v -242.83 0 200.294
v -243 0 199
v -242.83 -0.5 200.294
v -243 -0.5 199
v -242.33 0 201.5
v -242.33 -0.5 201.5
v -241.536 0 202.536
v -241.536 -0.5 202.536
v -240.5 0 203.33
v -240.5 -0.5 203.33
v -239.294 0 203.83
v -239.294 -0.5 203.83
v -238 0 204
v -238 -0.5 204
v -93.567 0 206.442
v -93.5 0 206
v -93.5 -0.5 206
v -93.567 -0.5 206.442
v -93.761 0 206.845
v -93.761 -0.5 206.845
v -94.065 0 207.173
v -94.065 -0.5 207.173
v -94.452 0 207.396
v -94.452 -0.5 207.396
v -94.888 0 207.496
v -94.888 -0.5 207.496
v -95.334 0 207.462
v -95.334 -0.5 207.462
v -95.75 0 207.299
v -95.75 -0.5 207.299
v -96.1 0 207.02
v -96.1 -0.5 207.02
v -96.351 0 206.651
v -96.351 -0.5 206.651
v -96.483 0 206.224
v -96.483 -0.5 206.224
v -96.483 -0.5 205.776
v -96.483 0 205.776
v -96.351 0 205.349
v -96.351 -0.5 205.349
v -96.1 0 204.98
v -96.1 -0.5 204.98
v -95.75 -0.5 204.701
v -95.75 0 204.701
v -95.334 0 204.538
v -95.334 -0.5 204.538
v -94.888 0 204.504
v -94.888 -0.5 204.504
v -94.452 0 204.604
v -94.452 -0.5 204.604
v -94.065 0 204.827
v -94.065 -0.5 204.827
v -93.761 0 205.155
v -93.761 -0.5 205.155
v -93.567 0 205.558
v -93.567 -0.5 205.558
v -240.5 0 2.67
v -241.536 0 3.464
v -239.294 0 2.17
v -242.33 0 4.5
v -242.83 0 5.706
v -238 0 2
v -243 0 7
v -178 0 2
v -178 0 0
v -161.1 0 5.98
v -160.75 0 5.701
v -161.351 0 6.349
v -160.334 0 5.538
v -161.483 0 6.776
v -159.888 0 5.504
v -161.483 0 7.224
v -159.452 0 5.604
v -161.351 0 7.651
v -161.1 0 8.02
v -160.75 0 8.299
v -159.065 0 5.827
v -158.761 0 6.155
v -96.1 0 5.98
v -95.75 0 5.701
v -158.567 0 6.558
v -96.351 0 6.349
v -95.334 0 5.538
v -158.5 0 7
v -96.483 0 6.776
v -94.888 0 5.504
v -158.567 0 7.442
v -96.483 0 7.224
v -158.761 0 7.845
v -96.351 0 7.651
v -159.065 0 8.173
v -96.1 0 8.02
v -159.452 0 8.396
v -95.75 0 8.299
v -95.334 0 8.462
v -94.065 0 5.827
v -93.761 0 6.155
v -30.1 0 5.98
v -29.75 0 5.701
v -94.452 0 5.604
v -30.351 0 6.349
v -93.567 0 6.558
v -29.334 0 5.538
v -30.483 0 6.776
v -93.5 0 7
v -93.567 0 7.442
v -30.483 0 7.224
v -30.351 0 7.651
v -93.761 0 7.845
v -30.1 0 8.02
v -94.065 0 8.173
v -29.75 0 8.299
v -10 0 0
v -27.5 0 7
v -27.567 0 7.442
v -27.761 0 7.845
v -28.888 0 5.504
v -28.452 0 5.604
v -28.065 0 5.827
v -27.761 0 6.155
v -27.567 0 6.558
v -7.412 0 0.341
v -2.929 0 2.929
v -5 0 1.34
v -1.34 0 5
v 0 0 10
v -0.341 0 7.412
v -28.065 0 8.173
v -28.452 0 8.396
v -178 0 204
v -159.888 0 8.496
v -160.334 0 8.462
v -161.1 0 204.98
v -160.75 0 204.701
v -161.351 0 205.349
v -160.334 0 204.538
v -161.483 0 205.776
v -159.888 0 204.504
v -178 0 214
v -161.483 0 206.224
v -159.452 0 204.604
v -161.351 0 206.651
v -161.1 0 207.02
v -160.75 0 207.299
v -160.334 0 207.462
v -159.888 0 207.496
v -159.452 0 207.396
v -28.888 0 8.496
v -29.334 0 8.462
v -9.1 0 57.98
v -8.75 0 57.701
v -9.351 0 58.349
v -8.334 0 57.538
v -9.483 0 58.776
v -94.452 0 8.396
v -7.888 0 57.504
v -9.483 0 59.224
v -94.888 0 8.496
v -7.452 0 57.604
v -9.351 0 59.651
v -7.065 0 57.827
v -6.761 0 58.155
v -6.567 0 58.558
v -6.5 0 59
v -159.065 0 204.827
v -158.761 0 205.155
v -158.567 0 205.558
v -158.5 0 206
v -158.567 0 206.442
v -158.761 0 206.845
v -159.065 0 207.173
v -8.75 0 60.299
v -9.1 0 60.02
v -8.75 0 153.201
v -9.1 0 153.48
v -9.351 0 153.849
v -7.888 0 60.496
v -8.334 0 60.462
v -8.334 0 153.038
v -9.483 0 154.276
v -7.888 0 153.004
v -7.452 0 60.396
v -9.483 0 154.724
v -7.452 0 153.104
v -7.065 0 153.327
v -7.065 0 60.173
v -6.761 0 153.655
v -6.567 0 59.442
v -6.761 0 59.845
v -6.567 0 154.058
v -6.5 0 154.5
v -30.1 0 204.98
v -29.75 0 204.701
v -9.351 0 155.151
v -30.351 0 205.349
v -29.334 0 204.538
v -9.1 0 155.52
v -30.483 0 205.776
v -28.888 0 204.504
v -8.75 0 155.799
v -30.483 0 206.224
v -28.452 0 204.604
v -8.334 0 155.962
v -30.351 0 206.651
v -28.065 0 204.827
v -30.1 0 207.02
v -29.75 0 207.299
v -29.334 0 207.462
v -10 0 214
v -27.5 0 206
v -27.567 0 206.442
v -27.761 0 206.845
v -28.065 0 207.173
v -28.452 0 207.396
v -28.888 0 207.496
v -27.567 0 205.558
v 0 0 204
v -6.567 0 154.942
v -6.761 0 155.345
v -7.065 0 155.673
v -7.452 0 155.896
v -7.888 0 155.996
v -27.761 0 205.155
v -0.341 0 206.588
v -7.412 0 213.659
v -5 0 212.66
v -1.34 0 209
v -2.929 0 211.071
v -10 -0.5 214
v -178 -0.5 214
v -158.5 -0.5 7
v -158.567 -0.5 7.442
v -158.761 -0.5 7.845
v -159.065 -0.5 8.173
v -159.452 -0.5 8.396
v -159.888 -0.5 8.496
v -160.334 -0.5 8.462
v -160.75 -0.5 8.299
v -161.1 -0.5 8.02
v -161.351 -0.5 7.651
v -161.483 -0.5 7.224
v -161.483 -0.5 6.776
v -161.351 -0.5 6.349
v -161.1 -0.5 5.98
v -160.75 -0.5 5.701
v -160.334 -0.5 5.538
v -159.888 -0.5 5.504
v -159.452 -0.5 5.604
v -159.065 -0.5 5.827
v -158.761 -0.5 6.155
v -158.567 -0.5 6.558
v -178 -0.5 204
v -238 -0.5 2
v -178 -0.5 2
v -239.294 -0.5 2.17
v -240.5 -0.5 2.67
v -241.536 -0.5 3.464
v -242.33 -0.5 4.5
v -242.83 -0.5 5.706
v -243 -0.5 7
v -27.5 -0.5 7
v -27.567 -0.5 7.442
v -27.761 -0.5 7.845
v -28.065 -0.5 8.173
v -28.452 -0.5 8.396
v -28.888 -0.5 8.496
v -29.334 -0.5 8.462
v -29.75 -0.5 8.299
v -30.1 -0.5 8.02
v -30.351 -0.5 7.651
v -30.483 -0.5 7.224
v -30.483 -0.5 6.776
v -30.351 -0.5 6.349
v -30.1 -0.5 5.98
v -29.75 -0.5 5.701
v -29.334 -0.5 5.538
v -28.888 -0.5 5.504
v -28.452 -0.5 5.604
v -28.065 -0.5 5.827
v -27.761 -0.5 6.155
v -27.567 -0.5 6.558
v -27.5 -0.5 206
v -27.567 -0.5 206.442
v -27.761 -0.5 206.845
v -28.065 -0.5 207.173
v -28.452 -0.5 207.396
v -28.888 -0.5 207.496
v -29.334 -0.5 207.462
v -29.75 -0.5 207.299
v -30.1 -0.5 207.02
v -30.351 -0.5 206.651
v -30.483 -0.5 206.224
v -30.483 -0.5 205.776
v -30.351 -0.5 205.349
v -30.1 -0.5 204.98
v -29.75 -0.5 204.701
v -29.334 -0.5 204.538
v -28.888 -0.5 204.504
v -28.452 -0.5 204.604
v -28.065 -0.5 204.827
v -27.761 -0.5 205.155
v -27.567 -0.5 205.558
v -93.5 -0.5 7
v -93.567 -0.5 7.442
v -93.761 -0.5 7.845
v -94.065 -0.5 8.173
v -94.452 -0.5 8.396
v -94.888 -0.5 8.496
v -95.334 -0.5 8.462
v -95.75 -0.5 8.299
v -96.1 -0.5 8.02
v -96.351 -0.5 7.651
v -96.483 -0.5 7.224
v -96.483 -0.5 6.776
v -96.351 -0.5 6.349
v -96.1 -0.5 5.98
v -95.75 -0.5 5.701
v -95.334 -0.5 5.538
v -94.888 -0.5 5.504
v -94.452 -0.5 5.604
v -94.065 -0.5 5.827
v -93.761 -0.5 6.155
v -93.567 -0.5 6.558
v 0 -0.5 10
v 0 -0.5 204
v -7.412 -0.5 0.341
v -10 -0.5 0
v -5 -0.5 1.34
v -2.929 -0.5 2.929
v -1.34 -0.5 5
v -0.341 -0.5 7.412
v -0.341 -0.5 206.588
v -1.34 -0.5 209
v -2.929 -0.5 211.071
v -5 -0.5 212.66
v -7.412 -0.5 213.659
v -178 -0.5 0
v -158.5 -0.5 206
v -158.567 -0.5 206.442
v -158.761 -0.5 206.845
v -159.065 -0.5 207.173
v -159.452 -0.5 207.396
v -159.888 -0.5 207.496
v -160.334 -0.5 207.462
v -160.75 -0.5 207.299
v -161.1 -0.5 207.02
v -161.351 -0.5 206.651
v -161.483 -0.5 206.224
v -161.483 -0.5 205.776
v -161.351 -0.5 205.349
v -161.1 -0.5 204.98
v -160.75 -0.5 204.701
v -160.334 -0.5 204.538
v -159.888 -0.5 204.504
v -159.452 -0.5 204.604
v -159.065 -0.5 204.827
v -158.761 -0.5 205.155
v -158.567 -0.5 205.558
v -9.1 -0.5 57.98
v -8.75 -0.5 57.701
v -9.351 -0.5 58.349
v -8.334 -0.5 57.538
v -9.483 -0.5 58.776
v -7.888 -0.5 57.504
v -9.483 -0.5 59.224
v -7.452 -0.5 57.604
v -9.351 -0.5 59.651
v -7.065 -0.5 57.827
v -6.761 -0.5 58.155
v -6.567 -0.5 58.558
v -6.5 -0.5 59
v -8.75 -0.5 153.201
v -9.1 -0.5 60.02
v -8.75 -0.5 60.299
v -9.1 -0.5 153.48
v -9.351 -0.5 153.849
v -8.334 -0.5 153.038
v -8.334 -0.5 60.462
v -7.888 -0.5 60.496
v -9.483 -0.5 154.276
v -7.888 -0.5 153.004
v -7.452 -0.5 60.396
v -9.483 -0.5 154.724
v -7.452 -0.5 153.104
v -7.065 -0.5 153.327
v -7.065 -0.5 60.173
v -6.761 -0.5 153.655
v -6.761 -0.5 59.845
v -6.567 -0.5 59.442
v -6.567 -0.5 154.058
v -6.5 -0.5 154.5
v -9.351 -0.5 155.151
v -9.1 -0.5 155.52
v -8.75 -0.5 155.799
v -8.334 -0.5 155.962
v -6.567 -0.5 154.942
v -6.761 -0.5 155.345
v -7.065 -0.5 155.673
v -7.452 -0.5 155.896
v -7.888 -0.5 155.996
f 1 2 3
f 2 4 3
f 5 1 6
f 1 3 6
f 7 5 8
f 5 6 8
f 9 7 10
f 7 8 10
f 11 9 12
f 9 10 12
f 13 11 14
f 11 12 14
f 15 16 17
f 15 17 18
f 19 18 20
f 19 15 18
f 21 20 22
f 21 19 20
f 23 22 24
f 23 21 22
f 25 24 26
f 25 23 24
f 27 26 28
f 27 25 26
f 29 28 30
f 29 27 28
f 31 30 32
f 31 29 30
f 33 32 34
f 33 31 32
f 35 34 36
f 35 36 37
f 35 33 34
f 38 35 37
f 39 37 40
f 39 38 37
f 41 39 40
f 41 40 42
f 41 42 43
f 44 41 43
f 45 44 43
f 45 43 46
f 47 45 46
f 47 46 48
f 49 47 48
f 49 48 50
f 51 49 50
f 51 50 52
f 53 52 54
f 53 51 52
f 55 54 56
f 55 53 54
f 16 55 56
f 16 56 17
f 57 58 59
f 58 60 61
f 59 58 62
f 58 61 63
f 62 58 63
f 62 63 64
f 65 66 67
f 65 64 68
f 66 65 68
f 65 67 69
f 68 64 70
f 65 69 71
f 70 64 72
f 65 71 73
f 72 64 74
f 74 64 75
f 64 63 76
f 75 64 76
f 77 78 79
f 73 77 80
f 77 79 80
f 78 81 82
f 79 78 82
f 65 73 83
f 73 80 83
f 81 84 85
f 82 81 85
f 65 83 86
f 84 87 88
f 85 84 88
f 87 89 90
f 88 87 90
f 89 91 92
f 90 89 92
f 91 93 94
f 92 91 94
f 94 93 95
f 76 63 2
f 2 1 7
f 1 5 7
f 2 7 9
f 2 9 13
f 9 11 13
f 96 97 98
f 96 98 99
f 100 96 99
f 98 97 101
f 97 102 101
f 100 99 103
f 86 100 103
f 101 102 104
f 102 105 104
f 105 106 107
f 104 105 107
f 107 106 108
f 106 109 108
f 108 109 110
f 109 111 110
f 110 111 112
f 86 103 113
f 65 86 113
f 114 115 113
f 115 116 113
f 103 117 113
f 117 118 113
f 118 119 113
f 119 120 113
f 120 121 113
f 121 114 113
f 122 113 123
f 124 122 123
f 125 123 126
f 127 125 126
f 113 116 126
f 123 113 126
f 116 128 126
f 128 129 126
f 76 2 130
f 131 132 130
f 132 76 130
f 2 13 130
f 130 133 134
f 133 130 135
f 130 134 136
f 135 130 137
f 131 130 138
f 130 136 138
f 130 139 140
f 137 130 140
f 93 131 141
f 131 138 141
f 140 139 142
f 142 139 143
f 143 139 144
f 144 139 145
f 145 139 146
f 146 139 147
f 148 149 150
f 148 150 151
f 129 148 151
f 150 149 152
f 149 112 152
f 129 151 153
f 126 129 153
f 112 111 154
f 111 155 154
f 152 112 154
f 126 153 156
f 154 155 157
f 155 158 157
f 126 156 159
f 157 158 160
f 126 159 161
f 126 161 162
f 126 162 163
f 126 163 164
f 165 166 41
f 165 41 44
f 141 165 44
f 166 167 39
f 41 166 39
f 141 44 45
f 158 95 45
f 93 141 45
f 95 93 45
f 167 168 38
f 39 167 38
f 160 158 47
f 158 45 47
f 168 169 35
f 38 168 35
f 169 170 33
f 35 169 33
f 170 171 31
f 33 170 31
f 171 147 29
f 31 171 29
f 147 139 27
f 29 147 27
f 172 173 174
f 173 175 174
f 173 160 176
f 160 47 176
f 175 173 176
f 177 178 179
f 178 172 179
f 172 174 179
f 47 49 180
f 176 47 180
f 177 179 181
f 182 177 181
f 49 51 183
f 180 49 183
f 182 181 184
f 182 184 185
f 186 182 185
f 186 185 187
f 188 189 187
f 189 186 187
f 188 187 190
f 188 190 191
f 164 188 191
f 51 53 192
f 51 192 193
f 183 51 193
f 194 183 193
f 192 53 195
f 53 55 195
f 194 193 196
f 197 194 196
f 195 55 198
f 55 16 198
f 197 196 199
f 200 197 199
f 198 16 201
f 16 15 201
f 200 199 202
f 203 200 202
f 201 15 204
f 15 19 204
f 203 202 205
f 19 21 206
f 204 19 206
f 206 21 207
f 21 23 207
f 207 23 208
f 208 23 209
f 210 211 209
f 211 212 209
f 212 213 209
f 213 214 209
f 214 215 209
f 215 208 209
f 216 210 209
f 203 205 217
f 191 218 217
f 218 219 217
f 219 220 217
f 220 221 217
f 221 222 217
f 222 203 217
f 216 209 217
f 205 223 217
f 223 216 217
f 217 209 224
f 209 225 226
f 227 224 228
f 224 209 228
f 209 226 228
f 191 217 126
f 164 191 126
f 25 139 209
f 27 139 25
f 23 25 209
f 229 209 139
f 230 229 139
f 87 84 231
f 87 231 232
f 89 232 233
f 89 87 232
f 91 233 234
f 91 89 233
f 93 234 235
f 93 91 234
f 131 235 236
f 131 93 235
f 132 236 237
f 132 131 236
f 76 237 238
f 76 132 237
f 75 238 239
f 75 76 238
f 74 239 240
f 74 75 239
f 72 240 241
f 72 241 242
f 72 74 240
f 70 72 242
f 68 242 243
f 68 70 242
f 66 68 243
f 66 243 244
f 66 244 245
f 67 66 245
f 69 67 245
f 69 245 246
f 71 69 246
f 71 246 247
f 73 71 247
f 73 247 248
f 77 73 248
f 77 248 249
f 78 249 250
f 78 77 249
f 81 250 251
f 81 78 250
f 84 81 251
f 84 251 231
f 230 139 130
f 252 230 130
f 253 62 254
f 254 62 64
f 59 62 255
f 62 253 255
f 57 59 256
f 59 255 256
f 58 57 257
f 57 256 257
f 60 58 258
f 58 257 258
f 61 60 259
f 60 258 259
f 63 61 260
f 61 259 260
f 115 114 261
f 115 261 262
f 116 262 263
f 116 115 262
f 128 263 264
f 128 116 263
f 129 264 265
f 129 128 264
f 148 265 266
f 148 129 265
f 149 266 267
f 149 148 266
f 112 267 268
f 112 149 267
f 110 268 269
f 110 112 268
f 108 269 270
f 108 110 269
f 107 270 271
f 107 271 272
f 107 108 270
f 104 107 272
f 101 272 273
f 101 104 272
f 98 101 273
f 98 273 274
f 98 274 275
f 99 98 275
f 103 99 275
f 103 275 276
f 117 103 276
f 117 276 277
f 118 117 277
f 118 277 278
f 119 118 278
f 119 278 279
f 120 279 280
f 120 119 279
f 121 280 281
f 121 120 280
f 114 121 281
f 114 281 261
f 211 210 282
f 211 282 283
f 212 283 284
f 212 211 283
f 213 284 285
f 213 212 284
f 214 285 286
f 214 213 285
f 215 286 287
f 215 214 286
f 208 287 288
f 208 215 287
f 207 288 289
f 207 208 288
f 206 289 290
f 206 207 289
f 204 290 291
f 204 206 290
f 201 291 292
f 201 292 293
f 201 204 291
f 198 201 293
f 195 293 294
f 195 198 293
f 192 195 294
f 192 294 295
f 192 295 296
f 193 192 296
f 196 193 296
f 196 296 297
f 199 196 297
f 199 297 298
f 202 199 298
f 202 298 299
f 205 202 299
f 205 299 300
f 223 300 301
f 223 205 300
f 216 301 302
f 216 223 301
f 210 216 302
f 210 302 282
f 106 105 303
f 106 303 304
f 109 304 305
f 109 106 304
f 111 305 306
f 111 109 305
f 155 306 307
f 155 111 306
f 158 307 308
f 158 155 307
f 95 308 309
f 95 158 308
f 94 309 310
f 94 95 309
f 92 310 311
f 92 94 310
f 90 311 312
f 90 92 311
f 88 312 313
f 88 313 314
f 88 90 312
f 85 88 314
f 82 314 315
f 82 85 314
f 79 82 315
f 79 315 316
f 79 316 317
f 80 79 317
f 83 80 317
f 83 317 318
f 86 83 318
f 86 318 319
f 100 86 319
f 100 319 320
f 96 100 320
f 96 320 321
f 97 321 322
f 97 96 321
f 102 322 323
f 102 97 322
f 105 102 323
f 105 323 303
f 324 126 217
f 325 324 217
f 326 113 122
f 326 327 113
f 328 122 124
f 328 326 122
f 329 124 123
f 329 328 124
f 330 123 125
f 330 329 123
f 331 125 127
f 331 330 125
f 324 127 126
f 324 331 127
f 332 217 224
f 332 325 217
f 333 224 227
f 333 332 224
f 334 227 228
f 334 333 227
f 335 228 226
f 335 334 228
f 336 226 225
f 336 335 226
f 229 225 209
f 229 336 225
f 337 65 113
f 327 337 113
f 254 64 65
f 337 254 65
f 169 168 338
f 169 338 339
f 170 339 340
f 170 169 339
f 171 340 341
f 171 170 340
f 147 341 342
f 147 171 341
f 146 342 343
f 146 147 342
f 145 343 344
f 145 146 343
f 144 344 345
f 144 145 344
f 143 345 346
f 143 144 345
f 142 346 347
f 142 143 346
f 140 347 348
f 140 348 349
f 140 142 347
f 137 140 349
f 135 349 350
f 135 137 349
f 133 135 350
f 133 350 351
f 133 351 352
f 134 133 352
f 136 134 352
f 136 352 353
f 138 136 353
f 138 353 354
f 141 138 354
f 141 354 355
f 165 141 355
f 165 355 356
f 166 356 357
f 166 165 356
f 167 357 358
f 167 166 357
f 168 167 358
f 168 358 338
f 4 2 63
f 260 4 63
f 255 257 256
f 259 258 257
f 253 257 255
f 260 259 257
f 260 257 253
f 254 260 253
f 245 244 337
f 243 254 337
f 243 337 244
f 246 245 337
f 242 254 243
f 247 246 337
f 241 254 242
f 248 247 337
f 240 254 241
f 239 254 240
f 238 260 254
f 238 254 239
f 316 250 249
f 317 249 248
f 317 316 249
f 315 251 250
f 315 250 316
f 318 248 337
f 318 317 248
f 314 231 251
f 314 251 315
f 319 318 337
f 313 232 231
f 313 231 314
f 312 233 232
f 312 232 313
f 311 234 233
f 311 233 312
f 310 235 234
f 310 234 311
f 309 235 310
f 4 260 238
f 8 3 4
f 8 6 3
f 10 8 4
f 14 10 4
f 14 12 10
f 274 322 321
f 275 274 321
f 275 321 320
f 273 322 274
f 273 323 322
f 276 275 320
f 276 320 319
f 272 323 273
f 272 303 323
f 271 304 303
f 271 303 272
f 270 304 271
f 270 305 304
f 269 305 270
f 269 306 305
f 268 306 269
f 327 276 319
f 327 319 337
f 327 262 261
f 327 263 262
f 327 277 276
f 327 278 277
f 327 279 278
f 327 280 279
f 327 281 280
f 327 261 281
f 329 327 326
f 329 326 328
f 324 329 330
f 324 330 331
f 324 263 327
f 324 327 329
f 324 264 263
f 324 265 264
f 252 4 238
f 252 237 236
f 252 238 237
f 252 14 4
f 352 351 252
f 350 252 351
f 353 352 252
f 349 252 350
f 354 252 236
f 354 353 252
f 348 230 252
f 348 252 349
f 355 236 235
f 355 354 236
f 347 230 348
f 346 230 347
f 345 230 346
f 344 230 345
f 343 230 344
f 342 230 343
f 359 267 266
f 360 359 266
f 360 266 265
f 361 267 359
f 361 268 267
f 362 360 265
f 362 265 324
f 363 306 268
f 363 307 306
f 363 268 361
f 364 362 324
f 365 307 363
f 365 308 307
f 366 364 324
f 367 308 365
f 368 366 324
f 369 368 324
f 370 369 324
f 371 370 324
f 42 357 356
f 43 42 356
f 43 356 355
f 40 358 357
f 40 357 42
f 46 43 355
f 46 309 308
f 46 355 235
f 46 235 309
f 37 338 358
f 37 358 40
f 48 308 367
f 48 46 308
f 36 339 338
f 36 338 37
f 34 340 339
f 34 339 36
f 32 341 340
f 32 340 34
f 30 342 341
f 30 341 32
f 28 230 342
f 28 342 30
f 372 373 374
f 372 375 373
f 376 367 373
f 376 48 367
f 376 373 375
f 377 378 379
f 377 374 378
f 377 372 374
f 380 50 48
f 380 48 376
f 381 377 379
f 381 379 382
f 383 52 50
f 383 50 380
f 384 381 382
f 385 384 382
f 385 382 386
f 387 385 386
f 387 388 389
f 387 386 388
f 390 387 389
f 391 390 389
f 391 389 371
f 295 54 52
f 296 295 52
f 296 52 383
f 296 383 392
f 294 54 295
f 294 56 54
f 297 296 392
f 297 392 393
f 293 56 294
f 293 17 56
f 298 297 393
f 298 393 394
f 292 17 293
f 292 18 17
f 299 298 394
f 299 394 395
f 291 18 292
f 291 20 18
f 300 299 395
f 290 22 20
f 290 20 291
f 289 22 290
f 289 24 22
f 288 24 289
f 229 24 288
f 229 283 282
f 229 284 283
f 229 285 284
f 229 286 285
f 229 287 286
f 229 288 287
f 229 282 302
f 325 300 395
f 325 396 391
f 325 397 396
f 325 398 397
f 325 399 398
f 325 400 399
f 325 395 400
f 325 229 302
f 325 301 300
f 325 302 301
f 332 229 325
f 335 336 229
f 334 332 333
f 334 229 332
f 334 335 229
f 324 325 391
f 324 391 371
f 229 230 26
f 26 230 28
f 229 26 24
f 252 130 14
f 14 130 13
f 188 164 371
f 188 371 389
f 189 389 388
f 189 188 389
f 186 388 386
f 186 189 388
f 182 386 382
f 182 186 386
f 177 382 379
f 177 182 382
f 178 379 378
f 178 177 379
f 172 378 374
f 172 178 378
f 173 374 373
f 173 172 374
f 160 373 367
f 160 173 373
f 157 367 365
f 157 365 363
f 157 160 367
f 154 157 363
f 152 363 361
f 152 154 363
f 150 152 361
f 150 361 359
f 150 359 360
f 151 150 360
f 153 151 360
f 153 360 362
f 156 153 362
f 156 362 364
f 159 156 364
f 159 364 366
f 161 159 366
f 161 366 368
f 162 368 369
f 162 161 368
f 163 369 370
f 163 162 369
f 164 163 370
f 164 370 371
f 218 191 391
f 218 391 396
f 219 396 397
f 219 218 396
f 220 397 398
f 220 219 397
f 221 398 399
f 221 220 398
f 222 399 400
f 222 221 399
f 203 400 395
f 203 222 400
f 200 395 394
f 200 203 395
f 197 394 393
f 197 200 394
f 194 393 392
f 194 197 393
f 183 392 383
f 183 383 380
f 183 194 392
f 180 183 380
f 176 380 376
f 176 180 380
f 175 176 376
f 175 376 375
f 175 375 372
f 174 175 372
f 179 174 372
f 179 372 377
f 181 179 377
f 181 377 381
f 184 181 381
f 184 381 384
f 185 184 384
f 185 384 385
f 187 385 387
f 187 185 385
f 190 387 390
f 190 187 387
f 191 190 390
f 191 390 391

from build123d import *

# Parameters (mm, degrees)
F0_R     = 1.5
F1_DEPTH = 0.5
F2_R     = 10
F3_R     = 5


with BuildPart() as f1:
    # F0 (on Front) → F1 (new body)
    with BuildSketch(Plane.XZ):
        Polygon((-178, 0), (0, 0), (0, 214), (-178, 214), (-178, 204), (-243, 204), (-243, 2), (-178, 2), align=None)
        with Locations((-160, 7)):
            Circle(F0_R, mode=Mode.SUBTRACT)
        with Locations((-95, 7)):
            Circle(F0_R, mode=Mode.SUBTRACT)
        with Locations((-29, 7)):
            Circle(F0_R, mode=Mode.SUBTRACT)
        with Locations((-8, 59)):
            Circle(F0_R, mode=Mode.SUBTRACT)
        with Locations((-160, 206)):
            Circle(F0_R, mode=Mode.SUBTRACT)
        with Locations((-8, 154.5)):
            Circle(F0_R, mode=Mode.SUBTRACT)
        with Locations((-95, 206)):
            Circle(F0_R, mode=Mode.SUBTRACT)
        with Locations((-29, 206)):
            Circle(F0_R, mode=Mode.SUBTRACT)
    extrude(amount=F1_DEPTH)

    # F2
    f2_edges = [f1.edges().sort_by_distance(p)[0] for p in [
        (0, -0.25, 214),
        (0, -0.25, 0),
    ]]
    fillet(f2_edges, radius=F2_R)

    # F3
    f3_edges = [f1.edges().sort_by_distance(p)[0] for p in [
        (-243, -0.25, 204),
        (-243, -0.25, 2),
    ]]
    fillet(f3_edges, radius=F3_R)


solid = f1.part
